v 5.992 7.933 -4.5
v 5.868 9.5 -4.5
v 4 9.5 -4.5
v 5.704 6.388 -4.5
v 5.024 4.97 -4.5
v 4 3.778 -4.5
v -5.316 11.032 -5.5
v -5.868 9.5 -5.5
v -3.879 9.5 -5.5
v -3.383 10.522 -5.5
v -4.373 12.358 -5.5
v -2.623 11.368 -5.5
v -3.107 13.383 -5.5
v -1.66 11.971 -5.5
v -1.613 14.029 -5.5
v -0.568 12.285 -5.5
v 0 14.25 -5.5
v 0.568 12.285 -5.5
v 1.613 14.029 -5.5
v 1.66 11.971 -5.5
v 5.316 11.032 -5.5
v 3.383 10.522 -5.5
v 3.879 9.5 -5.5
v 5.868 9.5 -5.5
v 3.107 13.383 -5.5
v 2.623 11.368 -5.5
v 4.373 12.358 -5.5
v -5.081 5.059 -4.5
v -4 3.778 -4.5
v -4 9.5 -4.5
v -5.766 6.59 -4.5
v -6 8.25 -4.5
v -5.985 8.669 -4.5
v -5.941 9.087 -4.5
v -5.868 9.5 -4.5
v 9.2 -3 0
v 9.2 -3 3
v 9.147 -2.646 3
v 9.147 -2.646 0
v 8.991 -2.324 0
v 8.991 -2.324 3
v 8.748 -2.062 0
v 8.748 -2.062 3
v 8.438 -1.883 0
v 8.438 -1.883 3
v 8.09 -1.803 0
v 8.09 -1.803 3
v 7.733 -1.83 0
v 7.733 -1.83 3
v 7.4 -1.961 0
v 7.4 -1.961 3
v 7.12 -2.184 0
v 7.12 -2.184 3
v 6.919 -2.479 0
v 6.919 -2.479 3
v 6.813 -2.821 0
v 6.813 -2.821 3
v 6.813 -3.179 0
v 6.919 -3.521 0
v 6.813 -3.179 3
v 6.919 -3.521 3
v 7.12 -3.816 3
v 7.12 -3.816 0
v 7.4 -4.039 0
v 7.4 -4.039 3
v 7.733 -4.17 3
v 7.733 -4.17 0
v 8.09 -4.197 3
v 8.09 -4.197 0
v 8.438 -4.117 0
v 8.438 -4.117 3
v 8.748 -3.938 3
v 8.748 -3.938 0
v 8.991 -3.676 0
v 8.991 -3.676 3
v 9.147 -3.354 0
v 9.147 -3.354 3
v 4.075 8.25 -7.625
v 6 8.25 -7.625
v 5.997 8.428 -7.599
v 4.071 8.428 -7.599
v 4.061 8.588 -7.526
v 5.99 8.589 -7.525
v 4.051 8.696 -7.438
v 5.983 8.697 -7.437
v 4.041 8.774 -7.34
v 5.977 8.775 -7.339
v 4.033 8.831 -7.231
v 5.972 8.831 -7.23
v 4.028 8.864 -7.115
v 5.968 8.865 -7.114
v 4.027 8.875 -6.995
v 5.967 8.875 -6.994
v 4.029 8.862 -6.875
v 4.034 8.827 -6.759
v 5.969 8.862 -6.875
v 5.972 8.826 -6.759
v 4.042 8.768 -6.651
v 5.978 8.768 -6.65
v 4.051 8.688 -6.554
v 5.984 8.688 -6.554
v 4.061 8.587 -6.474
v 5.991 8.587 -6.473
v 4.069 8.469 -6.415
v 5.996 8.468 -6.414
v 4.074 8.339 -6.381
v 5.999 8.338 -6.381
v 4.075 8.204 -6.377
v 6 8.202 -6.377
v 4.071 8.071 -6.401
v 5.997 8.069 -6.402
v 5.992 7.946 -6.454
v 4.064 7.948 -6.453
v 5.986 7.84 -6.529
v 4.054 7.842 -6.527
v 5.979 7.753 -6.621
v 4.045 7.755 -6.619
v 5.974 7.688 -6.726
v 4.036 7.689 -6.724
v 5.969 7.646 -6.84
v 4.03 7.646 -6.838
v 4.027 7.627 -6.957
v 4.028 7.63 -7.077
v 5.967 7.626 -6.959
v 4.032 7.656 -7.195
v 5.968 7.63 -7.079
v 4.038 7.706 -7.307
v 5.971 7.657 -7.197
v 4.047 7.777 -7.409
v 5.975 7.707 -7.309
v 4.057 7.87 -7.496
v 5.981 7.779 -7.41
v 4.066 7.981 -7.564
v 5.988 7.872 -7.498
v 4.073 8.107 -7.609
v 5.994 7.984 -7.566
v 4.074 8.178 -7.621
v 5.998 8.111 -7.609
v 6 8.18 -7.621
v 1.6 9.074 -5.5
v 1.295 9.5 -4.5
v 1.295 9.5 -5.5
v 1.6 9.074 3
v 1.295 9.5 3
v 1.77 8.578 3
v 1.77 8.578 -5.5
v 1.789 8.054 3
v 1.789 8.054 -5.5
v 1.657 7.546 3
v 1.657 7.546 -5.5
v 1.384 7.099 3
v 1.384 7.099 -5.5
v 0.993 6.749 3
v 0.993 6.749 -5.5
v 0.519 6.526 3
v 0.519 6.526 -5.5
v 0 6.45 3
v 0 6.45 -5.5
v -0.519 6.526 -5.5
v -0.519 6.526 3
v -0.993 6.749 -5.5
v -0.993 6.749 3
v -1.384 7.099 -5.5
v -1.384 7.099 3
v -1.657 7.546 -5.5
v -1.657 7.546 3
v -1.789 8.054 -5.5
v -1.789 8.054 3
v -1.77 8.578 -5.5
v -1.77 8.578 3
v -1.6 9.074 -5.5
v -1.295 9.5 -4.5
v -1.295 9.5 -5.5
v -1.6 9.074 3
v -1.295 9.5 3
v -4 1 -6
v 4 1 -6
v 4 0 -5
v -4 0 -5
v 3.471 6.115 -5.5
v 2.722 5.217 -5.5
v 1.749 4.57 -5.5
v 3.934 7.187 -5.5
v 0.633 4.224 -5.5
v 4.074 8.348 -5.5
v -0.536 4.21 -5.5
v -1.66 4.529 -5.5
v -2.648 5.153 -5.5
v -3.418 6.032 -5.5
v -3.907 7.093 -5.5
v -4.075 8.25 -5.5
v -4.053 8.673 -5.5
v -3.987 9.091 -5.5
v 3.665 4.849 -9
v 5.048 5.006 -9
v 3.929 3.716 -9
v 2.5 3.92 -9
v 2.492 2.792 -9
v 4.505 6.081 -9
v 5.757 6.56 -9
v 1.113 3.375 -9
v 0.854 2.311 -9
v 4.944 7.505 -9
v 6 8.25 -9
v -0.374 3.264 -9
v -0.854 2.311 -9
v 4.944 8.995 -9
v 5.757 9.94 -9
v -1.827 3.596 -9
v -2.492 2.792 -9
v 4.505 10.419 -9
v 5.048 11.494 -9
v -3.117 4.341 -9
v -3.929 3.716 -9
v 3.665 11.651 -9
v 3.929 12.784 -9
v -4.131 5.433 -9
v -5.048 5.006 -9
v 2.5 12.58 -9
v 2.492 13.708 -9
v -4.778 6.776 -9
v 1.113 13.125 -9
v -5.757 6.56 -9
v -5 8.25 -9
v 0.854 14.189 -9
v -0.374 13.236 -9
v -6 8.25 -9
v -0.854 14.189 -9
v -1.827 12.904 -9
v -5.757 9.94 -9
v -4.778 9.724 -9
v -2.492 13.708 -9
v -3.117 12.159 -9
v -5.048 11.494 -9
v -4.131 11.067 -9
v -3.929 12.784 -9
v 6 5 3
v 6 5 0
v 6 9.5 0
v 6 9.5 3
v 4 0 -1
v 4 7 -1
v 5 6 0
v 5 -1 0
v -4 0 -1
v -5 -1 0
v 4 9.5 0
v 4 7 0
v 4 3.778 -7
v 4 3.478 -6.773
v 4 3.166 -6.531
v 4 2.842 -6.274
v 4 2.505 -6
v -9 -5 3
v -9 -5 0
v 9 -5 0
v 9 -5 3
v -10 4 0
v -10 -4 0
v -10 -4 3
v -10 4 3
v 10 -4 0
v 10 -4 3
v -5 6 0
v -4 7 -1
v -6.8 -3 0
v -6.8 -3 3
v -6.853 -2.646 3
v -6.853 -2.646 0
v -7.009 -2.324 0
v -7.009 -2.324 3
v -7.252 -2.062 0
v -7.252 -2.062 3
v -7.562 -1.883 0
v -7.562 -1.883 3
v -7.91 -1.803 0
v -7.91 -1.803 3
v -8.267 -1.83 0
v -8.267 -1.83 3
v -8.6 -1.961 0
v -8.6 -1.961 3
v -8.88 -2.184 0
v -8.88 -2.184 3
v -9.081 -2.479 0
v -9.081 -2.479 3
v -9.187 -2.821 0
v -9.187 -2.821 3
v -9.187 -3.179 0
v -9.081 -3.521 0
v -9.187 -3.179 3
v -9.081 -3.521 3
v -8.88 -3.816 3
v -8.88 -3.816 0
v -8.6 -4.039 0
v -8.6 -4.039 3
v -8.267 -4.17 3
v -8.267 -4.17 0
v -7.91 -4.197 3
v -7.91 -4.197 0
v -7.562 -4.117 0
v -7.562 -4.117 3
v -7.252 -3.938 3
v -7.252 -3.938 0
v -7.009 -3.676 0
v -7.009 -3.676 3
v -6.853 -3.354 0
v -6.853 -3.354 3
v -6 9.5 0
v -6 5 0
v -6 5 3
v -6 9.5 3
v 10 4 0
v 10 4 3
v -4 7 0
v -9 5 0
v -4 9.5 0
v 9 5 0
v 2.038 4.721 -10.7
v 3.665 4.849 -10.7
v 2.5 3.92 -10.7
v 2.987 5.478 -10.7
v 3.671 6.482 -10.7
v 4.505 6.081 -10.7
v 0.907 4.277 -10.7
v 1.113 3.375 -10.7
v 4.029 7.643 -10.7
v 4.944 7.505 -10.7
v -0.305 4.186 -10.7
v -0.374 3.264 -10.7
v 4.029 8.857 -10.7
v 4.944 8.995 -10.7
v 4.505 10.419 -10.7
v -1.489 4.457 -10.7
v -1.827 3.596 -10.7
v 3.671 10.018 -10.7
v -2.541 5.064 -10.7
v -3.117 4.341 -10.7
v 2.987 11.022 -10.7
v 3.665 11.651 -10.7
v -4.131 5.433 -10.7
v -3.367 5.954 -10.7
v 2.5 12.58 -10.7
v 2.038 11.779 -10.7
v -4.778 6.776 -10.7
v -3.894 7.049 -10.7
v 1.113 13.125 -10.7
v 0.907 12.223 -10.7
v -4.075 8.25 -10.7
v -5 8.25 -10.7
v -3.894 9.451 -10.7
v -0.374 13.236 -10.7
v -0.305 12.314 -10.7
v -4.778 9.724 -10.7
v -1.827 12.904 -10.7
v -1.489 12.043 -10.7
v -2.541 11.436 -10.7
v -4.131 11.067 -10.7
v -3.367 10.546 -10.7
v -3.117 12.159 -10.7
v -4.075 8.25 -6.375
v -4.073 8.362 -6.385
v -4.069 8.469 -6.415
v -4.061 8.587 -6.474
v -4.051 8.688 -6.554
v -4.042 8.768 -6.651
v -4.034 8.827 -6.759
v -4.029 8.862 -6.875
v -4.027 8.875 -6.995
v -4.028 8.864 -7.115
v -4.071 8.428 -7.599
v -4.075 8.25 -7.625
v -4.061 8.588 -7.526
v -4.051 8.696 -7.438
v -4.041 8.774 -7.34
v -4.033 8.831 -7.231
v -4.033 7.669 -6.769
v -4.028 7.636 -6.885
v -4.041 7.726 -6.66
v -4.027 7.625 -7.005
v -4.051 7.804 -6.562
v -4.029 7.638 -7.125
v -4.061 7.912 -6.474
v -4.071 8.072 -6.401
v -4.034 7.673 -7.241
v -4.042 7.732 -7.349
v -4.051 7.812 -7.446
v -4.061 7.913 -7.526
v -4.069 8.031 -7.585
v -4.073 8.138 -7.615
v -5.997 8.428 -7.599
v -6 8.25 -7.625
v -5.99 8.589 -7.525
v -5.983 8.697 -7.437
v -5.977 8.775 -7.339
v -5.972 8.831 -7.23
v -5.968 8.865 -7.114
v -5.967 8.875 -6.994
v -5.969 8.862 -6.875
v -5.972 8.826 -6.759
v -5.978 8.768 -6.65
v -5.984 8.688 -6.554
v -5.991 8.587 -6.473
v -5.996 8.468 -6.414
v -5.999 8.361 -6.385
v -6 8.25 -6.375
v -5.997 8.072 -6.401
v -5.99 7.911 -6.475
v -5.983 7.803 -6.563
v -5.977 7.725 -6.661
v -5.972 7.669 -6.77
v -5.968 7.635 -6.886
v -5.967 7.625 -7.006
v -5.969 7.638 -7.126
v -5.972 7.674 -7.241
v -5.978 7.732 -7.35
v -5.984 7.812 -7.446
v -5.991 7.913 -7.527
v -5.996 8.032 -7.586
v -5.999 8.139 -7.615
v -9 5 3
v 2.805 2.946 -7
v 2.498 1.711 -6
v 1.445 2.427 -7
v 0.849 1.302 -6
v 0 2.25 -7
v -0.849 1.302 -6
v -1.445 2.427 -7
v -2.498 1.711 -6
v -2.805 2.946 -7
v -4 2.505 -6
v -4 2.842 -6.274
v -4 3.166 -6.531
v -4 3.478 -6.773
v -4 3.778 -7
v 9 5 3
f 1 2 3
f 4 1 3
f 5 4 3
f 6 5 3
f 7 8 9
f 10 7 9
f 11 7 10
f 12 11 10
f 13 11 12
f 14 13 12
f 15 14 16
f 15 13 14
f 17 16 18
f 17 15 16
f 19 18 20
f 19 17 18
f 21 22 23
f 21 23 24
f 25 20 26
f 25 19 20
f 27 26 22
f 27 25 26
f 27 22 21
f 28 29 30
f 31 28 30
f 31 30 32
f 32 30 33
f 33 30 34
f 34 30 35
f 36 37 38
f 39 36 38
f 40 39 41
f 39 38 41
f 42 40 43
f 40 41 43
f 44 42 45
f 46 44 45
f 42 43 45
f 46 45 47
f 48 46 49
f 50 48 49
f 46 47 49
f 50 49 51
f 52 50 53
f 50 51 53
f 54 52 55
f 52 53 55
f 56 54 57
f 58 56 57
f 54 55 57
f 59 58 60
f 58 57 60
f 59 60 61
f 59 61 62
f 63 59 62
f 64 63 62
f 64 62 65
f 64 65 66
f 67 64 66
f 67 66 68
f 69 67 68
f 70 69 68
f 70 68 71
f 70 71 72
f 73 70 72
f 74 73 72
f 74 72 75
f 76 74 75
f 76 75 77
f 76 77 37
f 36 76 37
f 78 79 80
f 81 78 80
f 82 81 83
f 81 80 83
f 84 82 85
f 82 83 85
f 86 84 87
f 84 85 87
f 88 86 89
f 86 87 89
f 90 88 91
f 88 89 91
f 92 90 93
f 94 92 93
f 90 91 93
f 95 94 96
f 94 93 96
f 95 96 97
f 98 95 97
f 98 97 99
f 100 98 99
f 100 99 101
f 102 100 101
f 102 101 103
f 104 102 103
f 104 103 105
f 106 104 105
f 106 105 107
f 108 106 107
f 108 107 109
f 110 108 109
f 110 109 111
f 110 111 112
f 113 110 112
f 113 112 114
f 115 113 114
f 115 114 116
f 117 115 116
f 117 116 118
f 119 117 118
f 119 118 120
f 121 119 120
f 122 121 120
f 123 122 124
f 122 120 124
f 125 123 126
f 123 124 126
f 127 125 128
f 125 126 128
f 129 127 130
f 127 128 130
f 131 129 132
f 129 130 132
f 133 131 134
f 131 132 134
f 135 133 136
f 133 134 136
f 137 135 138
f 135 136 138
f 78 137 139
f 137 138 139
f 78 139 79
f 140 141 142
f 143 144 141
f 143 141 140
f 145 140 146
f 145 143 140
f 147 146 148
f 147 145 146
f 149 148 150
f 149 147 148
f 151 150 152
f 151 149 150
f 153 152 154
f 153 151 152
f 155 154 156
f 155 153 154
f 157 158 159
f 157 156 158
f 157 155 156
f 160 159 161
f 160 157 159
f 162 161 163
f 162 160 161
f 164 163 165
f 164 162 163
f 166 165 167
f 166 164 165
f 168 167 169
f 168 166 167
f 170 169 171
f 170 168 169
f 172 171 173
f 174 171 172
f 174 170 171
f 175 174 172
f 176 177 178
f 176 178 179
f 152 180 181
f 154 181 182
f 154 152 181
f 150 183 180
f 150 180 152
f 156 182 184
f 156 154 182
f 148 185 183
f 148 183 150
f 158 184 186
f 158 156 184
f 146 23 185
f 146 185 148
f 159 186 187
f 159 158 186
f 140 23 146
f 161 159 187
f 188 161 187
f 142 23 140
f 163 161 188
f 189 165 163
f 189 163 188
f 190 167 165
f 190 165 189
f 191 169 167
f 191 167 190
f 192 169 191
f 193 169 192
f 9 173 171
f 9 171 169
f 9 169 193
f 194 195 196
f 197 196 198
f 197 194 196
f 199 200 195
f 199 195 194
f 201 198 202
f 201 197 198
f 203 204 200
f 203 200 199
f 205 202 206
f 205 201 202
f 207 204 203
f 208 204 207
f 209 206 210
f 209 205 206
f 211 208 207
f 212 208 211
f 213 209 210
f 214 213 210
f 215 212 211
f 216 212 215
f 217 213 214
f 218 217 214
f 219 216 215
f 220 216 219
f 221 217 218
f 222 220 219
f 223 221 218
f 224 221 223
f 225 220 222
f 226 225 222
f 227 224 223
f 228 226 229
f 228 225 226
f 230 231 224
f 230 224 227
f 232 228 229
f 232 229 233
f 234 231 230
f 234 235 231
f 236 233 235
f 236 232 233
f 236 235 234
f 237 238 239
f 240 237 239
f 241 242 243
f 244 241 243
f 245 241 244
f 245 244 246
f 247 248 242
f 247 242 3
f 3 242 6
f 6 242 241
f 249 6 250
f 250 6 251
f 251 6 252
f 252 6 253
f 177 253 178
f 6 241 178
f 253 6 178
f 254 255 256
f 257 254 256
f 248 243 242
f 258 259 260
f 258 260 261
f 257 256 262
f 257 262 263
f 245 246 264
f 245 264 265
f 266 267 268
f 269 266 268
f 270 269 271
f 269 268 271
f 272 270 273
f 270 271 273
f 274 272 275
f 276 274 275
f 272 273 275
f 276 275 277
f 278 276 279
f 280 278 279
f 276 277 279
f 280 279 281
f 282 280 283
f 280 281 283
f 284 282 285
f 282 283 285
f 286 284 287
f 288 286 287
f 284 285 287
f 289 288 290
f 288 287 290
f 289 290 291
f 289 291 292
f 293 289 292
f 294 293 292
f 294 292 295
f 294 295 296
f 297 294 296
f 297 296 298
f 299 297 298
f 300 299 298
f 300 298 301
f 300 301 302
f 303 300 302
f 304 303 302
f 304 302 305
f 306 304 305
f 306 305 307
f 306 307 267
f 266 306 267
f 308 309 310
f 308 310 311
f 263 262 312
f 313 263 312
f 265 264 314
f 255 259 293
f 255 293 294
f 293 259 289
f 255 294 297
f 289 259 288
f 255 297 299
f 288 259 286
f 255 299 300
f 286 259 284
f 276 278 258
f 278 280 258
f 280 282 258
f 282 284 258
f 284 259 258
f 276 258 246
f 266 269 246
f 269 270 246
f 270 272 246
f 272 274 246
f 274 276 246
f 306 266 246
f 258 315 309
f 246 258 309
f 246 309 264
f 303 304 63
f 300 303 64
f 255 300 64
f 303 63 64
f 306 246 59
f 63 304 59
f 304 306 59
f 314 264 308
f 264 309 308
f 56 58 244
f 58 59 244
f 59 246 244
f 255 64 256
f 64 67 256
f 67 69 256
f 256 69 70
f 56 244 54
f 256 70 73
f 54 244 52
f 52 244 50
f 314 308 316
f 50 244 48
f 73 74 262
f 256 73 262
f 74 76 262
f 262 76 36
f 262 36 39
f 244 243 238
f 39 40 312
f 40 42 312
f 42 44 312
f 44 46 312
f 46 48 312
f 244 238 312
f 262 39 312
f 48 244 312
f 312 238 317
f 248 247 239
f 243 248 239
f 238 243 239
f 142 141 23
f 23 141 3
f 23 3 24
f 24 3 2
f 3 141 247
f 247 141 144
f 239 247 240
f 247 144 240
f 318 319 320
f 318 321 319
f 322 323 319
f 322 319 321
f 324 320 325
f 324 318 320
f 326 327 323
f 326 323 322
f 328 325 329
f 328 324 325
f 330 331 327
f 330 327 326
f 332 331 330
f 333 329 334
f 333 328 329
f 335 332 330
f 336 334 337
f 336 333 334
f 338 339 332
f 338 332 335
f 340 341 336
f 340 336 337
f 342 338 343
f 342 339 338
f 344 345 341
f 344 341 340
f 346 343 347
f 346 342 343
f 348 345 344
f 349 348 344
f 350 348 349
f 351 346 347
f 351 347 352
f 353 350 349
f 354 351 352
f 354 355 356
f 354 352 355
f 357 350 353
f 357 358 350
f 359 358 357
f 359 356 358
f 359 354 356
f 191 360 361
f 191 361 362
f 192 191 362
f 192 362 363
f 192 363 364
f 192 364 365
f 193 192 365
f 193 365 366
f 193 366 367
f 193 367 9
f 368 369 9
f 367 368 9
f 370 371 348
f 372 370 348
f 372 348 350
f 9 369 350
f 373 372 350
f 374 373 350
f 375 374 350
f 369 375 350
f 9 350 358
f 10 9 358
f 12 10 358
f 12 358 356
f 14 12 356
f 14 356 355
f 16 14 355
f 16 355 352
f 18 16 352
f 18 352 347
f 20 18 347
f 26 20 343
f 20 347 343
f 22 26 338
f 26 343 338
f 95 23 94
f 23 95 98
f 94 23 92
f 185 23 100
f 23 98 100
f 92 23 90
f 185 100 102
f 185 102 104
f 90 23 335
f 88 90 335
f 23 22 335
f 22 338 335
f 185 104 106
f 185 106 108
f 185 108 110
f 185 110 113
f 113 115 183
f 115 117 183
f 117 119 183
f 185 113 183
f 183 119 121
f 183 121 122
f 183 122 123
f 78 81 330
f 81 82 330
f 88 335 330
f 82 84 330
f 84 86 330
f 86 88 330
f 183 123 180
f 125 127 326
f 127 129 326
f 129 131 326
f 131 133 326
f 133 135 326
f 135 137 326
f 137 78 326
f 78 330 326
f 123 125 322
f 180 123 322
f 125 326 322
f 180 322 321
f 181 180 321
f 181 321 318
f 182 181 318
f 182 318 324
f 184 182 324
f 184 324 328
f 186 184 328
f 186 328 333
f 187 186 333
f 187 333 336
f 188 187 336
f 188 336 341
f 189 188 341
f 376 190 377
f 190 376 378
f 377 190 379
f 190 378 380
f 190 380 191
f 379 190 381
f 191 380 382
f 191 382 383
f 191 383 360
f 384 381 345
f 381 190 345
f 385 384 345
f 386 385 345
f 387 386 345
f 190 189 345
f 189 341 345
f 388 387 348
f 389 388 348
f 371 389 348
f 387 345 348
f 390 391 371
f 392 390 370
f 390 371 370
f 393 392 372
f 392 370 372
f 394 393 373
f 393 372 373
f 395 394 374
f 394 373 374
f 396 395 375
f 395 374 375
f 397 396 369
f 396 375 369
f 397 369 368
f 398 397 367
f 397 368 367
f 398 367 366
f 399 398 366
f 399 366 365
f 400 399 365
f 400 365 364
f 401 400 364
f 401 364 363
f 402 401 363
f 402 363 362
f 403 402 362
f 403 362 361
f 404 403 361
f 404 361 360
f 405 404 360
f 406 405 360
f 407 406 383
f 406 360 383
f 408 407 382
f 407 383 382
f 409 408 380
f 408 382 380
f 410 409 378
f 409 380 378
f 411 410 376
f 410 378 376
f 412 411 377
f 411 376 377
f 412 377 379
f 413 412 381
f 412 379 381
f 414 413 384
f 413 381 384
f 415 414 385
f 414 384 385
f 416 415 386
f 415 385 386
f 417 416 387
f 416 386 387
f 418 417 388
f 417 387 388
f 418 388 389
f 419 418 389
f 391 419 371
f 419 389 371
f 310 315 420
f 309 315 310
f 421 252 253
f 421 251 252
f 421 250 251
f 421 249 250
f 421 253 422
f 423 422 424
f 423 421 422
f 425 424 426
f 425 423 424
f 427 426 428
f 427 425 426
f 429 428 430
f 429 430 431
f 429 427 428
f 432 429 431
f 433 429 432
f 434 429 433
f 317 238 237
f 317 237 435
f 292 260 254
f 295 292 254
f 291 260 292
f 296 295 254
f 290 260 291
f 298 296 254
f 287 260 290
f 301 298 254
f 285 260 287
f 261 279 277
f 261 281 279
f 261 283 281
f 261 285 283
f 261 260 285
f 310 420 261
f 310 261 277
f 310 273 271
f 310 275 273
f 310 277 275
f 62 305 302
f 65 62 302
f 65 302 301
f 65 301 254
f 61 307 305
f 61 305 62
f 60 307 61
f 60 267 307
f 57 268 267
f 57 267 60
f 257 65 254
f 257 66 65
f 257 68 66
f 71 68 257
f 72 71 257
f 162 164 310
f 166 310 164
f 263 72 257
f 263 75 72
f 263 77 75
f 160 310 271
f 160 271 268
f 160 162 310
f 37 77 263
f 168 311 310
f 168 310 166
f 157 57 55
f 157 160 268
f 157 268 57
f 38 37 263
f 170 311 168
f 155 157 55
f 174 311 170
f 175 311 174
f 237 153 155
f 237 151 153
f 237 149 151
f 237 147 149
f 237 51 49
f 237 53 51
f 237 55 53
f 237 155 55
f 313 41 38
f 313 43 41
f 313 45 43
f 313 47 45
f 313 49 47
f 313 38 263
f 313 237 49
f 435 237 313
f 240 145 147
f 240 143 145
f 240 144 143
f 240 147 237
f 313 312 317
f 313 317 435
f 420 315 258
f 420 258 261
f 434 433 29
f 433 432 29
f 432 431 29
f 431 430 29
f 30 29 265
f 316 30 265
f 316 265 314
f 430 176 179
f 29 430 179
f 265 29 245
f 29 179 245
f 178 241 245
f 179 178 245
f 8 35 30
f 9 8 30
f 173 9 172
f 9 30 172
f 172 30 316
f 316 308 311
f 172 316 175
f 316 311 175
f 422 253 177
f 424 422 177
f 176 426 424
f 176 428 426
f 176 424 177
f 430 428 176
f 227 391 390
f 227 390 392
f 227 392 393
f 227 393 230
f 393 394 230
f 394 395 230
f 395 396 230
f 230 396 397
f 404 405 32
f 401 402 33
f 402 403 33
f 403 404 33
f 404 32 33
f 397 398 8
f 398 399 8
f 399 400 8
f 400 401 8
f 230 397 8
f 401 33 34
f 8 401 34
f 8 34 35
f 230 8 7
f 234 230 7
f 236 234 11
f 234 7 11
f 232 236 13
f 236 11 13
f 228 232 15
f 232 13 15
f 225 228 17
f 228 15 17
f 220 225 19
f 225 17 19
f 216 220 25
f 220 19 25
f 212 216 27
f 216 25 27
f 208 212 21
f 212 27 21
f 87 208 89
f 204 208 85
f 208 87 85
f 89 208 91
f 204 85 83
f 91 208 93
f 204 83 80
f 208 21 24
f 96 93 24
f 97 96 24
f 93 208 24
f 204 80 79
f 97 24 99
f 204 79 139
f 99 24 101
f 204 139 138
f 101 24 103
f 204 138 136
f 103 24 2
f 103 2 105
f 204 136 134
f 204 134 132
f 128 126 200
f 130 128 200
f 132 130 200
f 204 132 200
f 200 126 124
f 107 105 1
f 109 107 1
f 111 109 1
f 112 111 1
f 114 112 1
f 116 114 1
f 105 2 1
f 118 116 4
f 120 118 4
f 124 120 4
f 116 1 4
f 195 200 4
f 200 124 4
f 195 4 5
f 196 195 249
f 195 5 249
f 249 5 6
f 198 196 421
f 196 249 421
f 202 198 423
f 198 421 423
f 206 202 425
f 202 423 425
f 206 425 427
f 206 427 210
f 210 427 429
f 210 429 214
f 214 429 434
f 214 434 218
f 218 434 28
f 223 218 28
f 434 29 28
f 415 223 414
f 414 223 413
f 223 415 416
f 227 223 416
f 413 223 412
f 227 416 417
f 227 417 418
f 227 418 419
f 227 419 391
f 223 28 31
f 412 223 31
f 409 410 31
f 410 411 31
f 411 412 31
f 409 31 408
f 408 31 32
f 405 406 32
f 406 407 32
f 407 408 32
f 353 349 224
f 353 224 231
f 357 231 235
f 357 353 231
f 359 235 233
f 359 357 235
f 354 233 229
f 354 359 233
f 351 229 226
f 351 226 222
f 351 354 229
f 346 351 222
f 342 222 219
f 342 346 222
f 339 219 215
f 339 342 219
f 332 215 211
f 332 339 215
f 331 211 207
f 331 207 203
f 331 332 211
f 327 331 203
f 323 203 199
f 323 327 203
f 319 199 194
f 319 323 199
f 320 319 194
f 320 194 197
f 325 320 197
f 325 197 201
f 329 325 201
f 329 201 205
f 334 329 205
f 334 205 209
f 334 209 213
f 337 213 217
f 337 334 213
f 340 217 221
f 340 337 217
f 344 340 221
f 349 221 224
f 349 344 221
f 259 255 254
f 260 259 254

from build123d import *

# Parameters (mm, degrees)
SKETCH1_W                = 20
SKETCH1_H                = 10
BOSS_EXTRUDE1_DEPTH      = 3
SKETCH2_W                = 8
SKETCH2_H                = 9.5
BOSS_EXTRUDE2_DEPTH      = 6
BOSS_EXTRUDE3_DEPTH      = 6
BOSS_EXTRUDE3_DEPTH_BACK = 1.5
SKETCH3_R                = 6
CHAMFER1_SIZE            = 1
CHAMFER2_SIZE            = 1
CHAMFER3_SIZE            = 1
CHAMFER4_SIZE            = 2
CHAMFER5_SIZE            = 2
M2_CLEARANCE_HOLE1_D     = 2.4
SKETCH21_R               = 4.075
CUT_EXTRUDE10_DEPTH      = 6.5
SKETCH25_W               = 12
SKETCH25_H               = 4.5
BOSS_EXTRUDE6_DEPTH      = 3
M1_6_TAPPED_HOLE2_D      = 1.25
CUT_EXTRUDE15_START      = -3
SKETCH40_R               = 6
CUT_EXTRUDE15_DEPTH      = 3
BOSS_EXTRUDE8_START      = 1.7
SKETCH41_R               = 5
SKETCH41_R_2             = 4.075
BOSS_EXTRUDE8_DEPTH      = 1.7
CUT_EXTRUDE16_DEPTH      = 1


with BuildPart() as part:
    # Sketch1 → Boss-Extrude1 (new body)
    with BuildSketch(Plane.XY):
        Rectangle(SKETCH1_W, SKETCH1_H)
    extrude(amount=BOSS_EXTRUDE1_DEPTH)

    # Sketch2 → Boss-Extrude2 (add)
    with BuildSketch(Plane(origin=(0, 0, 0), x_dir=(-1, 0, 0), z_dir=(0, 0, -1))):
        with Locations((0, 4.75)):
            Rectangle(SKETCH2_W, SKETCH2_H)
    extrude(amount=BOSS_EXTRUDE2_DEPTH)

    # Sketch3 → Boss-Extrude3 (add, two sides: drawn at the far end of the back side and taken through both)
    with BuildSketch(Plane(origin=(0, 0, -6), x_dir=(-1, 0, 0), z_dir=(0, 0, -1)).offset(-BOSS_EXTRUDE3_DEPTH_BACK)):
        with Locations((0, 8.25)):
            Circle(SKETCH3_R)
    extrude(amount=BOSS_EXTRUDE3_DEPTH + BOSS_EXTRUDE3_DEPTH_BACK)

    # Chamfer1
    chamfer1_edges = [part.edges().sort_by_distance(p)[0] for p in [
        (-10, 5, 1.5),
        (10, 5, 1.5),
        (10, -5, 1.5),
        (-10, -5, 1.5),
    ]]
    chamfer(chamfer1_edges, length=CHAMFER1_SIZE)

    # Chamfer2
    chamfer2_edges = [part.edges().sort_by_distance(p)[0] for p in [
        (4, 2.5, 0),
        (-4, 2.5, 0),
        (0, 0, 0),
        (0, 0, -6),
    ]]
    chamfer(chamfer2_edges, length=CHAMFER2_SIZE)

    # Chamfer3
    # the kernel refuses this chamfer: 1 mm, written as the material it adds along each edge
    with BuildSketch(Plane(origin=(0, 8.25, -6), x_dir=(0.9161991076005935, -0.4007233400138756, 0), z_dir=(0.4007233400138756, 0.9161991076005935, 0))) as chamfer3_piece_1_section:
        Polygon((6 + CHAMFER3_SIZE, 0), (6, CHAMFER3_SIZE), (6, 0), align=None)
    chamfer3_piece_1 = revolve(axis=Axis((0, 8.25, -6), (0, 0, -1)), revolution_arc=132.753188511, mode=Mode.PRIVATE)
    chamfer3_piece_1 = split(chamfer3_piece_1, bisect_by=Plane(origin=(-4, 1.761901104, -6.488098896), z_dir=(1, 0, 0)), keep=Keep.TOP, mode=Mode.PRIVATE)
    chamfer3_piece_1 = split(chamfer3_piece_1, bisect_by=Plane(origin=(4, 1.761901104, -6.488098896), z_dir=(-1, 0, 0)), keep=Keep.TOP, mode=Mode.PRIVATE)
    add(chamfer3_piece_1)

    # Chamfer4
    chamfer4_edges = [part.edges().sort_by_distance(p)[0] for p in [
        (0, 5, 0),
    ]]
    chamfer(chamfer4_edges, length=CHAMFER4_SIZE)

    # Chamfer5
    # the kernel refuses this chamfer: 2 mm, written as the material it adds along each edge
    with BuildSketch(Plane(origin=(4, 5, -6.143365976), x_dir=(0.9996219169112968, -0.02749587661058651, 0), z_dir=(0, 0, 1))) as chamfer5_piece_1_section:
        Polygon((CHAMFER5_SIZE * 0.999621916911, CHAMFER5_SIZE * 0.0274958766106), (-CHAMFER5_SIZE * 0.0274958766106, CHAMFER5_SIZE * 0.999621916911), (0, 0), align=None)
    chamfer5_piece_1 = extrude(amount=13.286731952, mode=Mode.PRIVATE)
    chamfer5_piece_1 = split(chamfer5_piece_1, bisect_by=Plane(origin=(4.448565439, 5.872663391, -0.551434561), z_dir=(-0.7071067811865476, 0, 0.7071067811865476)), keep=Keep.TOP, mode=Mode.PRIVATE)
    chamfer5_piece_1 = split(chamfer5_piece_1, bisect_by=Plane(origin=(4.264786899, 6.620159706, 0.379840294), z_dir=(0, -0.7071067811865476, -0.7071067811865476)), keep=Keep.TOP, mode=Mode.PRIVATE)
    chamfer5_piece_1 = split(chamfer5_piece_1, bisect_by=Plane(origin=(4.264786899, 5.872663391, 0), z_dir=(0, 0, -1)), keep=Keep.TOP, mode=Mode.PRIVATE)
    add(chamfer5_piece_1)
    with BuildSketch(Plane(origin=(4, 5, -6.143365976), x_dir=(0.9996219169112968, -0.02749587661058651, 0), z_dir=(0, 0, 1))) as chamfer5_piece_2_section:
        Polygon((CHAMFER5_SIZE * 0.999621916911, CHAMFER5_SIZE * 0.0274958766106), (-CHAMFER5_SIZE * 0.0274958766106, CHAMFER5_SIZE * 0.999621916911), (0, 0), align=None)
    chamfer5_piece_2 = extrude(amount=13.286731952, mode=Mode.PRIVATE)
    chamfer5_piece_2 = split(chamfer5_piece_2, bisect_by=Plane(origin=(5.409489173, 5.195513982, 0.409489173), z_dir=(0.7071067811865476, 0, -0.7071067811865476)), keep=Keep.TOP, mode=Mode.PRIVATE)
    chamfer5_piece_2 = split(chamfer5_piece_2, bisect_by=Plane(origin=(5.545985564, 5.195513982, 0), z_dir=(0, 0, 1)), keep=Keep.TOP, mode=Mode.PRIVATE)
    add(chamfer5_piece_2)
    with BuildSketch(Plane(origin=(4, 5, -6.143365976), x_dir=(0.9996219169112968, -0.02749587661058651, 0), z_dir=(0, 0, 1))) as chamfer5_piece_3_section:
        Polygon((CHAMFER5_SIZE * 0.999621916911, CHAMFER5_SIZE * 0.0274958766106), (-CHAMFER5_SIZE * 0.0274958766106, CHAMFER5_SIZE * 0.999621916911), (0, 0), align=None)
    chamfer5_piece_3 = extrude(amount=13.286731952, mode=Mode.PRIVATE)
    chamfer5_piece_3 = split(chamfer5_piece_3, bisect_by=Plane(origin=(5.251928591, 5.490690976, 0.251928591), z_dir=(-0.7071067811865476, 0, 0.7071067811865476)), keep=Keep.TOP, mode=Mode.PRIVATE)
    chamfer5_piece_3 = split(chamfer5_piece_3, bisect_by=Plane(origin=(4.702100532, 5.844467162, 1.155532838), z_dir=(0, -0.7071067811865476, -0.7071067811865476)), keep=Keep.TOP, mode=Mode.PRIVATE)
    chamfer5_piece_3 = split(chamfer5_piece_3, bisect_by=Plane(origin=(4.702100532, 5.490690976, 0), z_dir=(0, 0, 1)), keep=Keep.TOP, mode=Mode.PRIVATE)
    add(chamfer5_piece_3)
    with BuildSketch(Plane(origin=(-4, 5, 7.143365976), x_dir=(-0.9996219169112968, -0.027495876610586487, 0), z_dir=(0, 0, -1))) as chamfer5_piece_4_section:
        Polygon((CHAMFER5_SIZE * 0.999621916911, CHAMFER5_SIZE * 0.0274958766106), (-CHAMFER5_SIZE * 0.0274958766106, CHAMFER5_SIZE * 0.999621916911), (0, 0), align=None)
    chamfer5_piece_4 = extrude(amount=13.286731952, mode=Mode.PRIVATE)
    chamfer5_piece_4 = split(chamfer5_piece_4, bisect_by=Plane(origin=(-5.251928591, 5.490690976, 0.251928591), z_dir=(0.7071067811865476, 0, 0.7071067811865476)), keep=Keep.TOP, mode=Mode.PRIVATE)
    chamfer5_piece_4 = split(chamfer5_piece_4, bisect_by=Plane(origin=(-4.702100532, 5.844467162, 1.155532838), z_dir=(0, -0.7071067811865476, -0.7071067811865476)), keep=Keep.TOP, mode=Mode.PRIVATE)
    chamfer5_piece_4 = split(chamfer5_piece_4, bisect_by=Plane(origin=(-4.702100532, 5.490690976, 0), z_dir=(0, 0, 1)), keep=Keep.TOP, mode=Mode.PRIVATE)
    add(chamfer5_piece_4)
    with BuildSketch(Plane(origin=(-4, 5, 7.143365976), x_dir=(-0.9996219169112968, -0.027495876610586487, 0), z_dir=(0, 0, -1))) as chamfer5_piece_5_section:
        Polygon((CHAMFER5_SIZE * 0.999621916911, CHAMFER5_SIZE * 0.0274958766106), (-CHAMFER5_SIZE * 0.0274958766106, CHAMFER5_SIZE * 0.999621916911), (0, 0), align=None)
    chamfer5_piece_5 = extrude(amount=13.286731952, mode=Mode.PRIVATE)
    chamfer5_piece_5 = split(chamfer5_piece_5, bisect_by=Plane(origin=(-4.448565439, 5.872663391, -0.551434561), z_dir=(0.7071067811865476, 0, 0.7071067811865476)), keep=Keep.TOP, mode=Mode.PRIVATE)
    chamfer5_piece_5 = split(chamfer5_piece_5, bisect_by=Plane(origin=(-4.264786899, 6.620159706, 0.379840294), z_dir=(0, -0.7071067811865476, -0.7071067811865476)), keep=Keep.TOP, mode=Mode.PRIVATE)
    chamfer5_piece_5 = split(chamfer5_piece_5, bisect_by=Plane(origin=(-4.264786899, 5.872663391, 0), z_dir=(0, 0, -1)), keep=Keep.TOP, mode=Mode.PRIVATE)
    add(chamfer5_piece_5)
    with BuildSketch(Plane(origin=(-4, 5, 7.143365976), x_dir=(-0.9996219169112968, -0.027495876610586487, 0), z_dir=(0, 0, -1))) as chamfer5_piece_6_section:
        Polygon((CHAMFER5_SIZE * 0.999621916911, CHAMFER5_SIZE * 0.0274958766106), (-CHAMFER5_SIZE * 0.0274958766106, CHAMFER5_SIZE * 0.999621916911), (0, 0), align=None)
    chamfer5_piece_6 = extrude(amount=13.286731952, mode=Mode.PRIVATE)
    chamfer5_piece_6 = split(chamfer5_piece_6, bisect_by=Plane(origin=(-5.409489173, 5.195513982, 0.409489173), z_dir=(-0.7071067811865476, 0, -0.7071067811865476)), keep=Keep.TOP, mode=Mode.PRIVATE)
    chamfer5_piece_6 = split(chamfer5_piece_6, bisect_by=Plane(origin=(-5.545985564, 5.195513982, 0), z_dir=(0, 0, 1)), keep=Keep.TOP, mode=Mode.PRIVATE)
    add(chamfer5_piece_6)

    # M2 Clearance Hole1 (through all)
    with Locations(Plane(origin=(0, 0, 0), x_dir=(-1, 0, 0), z_dir=(0, 0, -1))):
        with Locations((8, -3), (-8, -3)):
            Hole(M2_CLEARANCE_HOLE1_D / 2)

    # Sketch21 → Cut-Extrude10 (cut)
    with BuildSketch(Plane(origin=(0, 0, -12), x_dir=(-1, 0, 0), z_dir=(0, 0, -1))):
        with Locations((0, 8.25)):
            Circle(SKETCH21_R)
    extrude(amount=-CUT_EXTRUDE10_DEPTH, mode=Mode.SUBTRACT)

    # Sketch25 → Boss-Extrude6 (add)
    with BuildSketch(Plane.XY):
        with Locations((0, 7.25)):
            Rectangle(SKETCH25_W, SKETCH25_H)
    extrude(amount=BOSS_EXTRUDE6_DEPTH)

    # Sketch24 → CSK SLOT for M1.6 Countersunk Flat Head (revolve, cut)
    with BuildSketch(Plane(origin=(0, 8.25, 3), x_dir=(0, -1, 0), z_dir=(1, 0, 0))):
        Polygon((0, 0), (0, 40.540774557), (0.9, 40), (0.9, 9.9), (1.8, 9), (1.8, 0), align=None)
    revolve(axis=Axis((0, 8.25, 9.35), (0, 0, -1)), mode=Mode.SUBTRACT)

    # M1.6 Tapped Hole2 (through all)
    with Locations(Plane.ZY.offset(6)):
        with Locations((-7, 8.25)):
            Hole(M1_6_TAPPED_HOLE2_D / 2)

    # Sketch40 → Cut-Extrude15 (cut)
    with BuildSketch(Plane(origin=(0, 0, -12), x_dir=(-1, 0, 0), z_dir=(0, 0, -1)).offset(CUT_EXTRUDE15_START)):
        with Locations((0, 8.25)):
            Circle(SKETCH40_R)
    extrude(amount=CUT_EXTRUDE15_DEPTH, mode=Mode.SUBTRACT)

    # Sketch41 → Boss-Extrude8 (add)
    with BuildSketch(Plane(origin=(0, 0, -9), x_dir=(-1, 0, 0), z_dir=(0, 0, -1)).offset(BOSS_EXTRUDE8_START)):
        with Locations((0, 8.25)):
            Circle(SKETCH41_R)
        with Locations((0, 8.25)):
            Circle(SKETCH41_R_2, mode=Mode.SUBTRACT)
    extrude(amount=-BOSS_EXTRUDE8_DEPTH)

    # Sketch43 → Cut-Extrude16 (cut)
    with BuildSketch(Plane.XY.offset(-4.5)):
        with BuildLine():
            Line((-4, 9.5), (-1.295183385, 9.5))
            ThreePointArc((-1.295183385, 9.5), (0, 10.05), (1.295183385, 9.5))
            Line((1.295183385, 9.5), (4, 9.5))
            Line((4, 9.5), (5.868347297, 9.5))
            ThreePointArc((5.868347297, 9.5), (0, 14.25), (-5.868347297, 9.5))
            Line((-5.868347297, 9.5), (-4, 9.5))
        make_face()
    extrude(amount=-CUT_EXTRUDE16_DEPTH, mode=Mode.SUBTRACT)


solid = part.part
